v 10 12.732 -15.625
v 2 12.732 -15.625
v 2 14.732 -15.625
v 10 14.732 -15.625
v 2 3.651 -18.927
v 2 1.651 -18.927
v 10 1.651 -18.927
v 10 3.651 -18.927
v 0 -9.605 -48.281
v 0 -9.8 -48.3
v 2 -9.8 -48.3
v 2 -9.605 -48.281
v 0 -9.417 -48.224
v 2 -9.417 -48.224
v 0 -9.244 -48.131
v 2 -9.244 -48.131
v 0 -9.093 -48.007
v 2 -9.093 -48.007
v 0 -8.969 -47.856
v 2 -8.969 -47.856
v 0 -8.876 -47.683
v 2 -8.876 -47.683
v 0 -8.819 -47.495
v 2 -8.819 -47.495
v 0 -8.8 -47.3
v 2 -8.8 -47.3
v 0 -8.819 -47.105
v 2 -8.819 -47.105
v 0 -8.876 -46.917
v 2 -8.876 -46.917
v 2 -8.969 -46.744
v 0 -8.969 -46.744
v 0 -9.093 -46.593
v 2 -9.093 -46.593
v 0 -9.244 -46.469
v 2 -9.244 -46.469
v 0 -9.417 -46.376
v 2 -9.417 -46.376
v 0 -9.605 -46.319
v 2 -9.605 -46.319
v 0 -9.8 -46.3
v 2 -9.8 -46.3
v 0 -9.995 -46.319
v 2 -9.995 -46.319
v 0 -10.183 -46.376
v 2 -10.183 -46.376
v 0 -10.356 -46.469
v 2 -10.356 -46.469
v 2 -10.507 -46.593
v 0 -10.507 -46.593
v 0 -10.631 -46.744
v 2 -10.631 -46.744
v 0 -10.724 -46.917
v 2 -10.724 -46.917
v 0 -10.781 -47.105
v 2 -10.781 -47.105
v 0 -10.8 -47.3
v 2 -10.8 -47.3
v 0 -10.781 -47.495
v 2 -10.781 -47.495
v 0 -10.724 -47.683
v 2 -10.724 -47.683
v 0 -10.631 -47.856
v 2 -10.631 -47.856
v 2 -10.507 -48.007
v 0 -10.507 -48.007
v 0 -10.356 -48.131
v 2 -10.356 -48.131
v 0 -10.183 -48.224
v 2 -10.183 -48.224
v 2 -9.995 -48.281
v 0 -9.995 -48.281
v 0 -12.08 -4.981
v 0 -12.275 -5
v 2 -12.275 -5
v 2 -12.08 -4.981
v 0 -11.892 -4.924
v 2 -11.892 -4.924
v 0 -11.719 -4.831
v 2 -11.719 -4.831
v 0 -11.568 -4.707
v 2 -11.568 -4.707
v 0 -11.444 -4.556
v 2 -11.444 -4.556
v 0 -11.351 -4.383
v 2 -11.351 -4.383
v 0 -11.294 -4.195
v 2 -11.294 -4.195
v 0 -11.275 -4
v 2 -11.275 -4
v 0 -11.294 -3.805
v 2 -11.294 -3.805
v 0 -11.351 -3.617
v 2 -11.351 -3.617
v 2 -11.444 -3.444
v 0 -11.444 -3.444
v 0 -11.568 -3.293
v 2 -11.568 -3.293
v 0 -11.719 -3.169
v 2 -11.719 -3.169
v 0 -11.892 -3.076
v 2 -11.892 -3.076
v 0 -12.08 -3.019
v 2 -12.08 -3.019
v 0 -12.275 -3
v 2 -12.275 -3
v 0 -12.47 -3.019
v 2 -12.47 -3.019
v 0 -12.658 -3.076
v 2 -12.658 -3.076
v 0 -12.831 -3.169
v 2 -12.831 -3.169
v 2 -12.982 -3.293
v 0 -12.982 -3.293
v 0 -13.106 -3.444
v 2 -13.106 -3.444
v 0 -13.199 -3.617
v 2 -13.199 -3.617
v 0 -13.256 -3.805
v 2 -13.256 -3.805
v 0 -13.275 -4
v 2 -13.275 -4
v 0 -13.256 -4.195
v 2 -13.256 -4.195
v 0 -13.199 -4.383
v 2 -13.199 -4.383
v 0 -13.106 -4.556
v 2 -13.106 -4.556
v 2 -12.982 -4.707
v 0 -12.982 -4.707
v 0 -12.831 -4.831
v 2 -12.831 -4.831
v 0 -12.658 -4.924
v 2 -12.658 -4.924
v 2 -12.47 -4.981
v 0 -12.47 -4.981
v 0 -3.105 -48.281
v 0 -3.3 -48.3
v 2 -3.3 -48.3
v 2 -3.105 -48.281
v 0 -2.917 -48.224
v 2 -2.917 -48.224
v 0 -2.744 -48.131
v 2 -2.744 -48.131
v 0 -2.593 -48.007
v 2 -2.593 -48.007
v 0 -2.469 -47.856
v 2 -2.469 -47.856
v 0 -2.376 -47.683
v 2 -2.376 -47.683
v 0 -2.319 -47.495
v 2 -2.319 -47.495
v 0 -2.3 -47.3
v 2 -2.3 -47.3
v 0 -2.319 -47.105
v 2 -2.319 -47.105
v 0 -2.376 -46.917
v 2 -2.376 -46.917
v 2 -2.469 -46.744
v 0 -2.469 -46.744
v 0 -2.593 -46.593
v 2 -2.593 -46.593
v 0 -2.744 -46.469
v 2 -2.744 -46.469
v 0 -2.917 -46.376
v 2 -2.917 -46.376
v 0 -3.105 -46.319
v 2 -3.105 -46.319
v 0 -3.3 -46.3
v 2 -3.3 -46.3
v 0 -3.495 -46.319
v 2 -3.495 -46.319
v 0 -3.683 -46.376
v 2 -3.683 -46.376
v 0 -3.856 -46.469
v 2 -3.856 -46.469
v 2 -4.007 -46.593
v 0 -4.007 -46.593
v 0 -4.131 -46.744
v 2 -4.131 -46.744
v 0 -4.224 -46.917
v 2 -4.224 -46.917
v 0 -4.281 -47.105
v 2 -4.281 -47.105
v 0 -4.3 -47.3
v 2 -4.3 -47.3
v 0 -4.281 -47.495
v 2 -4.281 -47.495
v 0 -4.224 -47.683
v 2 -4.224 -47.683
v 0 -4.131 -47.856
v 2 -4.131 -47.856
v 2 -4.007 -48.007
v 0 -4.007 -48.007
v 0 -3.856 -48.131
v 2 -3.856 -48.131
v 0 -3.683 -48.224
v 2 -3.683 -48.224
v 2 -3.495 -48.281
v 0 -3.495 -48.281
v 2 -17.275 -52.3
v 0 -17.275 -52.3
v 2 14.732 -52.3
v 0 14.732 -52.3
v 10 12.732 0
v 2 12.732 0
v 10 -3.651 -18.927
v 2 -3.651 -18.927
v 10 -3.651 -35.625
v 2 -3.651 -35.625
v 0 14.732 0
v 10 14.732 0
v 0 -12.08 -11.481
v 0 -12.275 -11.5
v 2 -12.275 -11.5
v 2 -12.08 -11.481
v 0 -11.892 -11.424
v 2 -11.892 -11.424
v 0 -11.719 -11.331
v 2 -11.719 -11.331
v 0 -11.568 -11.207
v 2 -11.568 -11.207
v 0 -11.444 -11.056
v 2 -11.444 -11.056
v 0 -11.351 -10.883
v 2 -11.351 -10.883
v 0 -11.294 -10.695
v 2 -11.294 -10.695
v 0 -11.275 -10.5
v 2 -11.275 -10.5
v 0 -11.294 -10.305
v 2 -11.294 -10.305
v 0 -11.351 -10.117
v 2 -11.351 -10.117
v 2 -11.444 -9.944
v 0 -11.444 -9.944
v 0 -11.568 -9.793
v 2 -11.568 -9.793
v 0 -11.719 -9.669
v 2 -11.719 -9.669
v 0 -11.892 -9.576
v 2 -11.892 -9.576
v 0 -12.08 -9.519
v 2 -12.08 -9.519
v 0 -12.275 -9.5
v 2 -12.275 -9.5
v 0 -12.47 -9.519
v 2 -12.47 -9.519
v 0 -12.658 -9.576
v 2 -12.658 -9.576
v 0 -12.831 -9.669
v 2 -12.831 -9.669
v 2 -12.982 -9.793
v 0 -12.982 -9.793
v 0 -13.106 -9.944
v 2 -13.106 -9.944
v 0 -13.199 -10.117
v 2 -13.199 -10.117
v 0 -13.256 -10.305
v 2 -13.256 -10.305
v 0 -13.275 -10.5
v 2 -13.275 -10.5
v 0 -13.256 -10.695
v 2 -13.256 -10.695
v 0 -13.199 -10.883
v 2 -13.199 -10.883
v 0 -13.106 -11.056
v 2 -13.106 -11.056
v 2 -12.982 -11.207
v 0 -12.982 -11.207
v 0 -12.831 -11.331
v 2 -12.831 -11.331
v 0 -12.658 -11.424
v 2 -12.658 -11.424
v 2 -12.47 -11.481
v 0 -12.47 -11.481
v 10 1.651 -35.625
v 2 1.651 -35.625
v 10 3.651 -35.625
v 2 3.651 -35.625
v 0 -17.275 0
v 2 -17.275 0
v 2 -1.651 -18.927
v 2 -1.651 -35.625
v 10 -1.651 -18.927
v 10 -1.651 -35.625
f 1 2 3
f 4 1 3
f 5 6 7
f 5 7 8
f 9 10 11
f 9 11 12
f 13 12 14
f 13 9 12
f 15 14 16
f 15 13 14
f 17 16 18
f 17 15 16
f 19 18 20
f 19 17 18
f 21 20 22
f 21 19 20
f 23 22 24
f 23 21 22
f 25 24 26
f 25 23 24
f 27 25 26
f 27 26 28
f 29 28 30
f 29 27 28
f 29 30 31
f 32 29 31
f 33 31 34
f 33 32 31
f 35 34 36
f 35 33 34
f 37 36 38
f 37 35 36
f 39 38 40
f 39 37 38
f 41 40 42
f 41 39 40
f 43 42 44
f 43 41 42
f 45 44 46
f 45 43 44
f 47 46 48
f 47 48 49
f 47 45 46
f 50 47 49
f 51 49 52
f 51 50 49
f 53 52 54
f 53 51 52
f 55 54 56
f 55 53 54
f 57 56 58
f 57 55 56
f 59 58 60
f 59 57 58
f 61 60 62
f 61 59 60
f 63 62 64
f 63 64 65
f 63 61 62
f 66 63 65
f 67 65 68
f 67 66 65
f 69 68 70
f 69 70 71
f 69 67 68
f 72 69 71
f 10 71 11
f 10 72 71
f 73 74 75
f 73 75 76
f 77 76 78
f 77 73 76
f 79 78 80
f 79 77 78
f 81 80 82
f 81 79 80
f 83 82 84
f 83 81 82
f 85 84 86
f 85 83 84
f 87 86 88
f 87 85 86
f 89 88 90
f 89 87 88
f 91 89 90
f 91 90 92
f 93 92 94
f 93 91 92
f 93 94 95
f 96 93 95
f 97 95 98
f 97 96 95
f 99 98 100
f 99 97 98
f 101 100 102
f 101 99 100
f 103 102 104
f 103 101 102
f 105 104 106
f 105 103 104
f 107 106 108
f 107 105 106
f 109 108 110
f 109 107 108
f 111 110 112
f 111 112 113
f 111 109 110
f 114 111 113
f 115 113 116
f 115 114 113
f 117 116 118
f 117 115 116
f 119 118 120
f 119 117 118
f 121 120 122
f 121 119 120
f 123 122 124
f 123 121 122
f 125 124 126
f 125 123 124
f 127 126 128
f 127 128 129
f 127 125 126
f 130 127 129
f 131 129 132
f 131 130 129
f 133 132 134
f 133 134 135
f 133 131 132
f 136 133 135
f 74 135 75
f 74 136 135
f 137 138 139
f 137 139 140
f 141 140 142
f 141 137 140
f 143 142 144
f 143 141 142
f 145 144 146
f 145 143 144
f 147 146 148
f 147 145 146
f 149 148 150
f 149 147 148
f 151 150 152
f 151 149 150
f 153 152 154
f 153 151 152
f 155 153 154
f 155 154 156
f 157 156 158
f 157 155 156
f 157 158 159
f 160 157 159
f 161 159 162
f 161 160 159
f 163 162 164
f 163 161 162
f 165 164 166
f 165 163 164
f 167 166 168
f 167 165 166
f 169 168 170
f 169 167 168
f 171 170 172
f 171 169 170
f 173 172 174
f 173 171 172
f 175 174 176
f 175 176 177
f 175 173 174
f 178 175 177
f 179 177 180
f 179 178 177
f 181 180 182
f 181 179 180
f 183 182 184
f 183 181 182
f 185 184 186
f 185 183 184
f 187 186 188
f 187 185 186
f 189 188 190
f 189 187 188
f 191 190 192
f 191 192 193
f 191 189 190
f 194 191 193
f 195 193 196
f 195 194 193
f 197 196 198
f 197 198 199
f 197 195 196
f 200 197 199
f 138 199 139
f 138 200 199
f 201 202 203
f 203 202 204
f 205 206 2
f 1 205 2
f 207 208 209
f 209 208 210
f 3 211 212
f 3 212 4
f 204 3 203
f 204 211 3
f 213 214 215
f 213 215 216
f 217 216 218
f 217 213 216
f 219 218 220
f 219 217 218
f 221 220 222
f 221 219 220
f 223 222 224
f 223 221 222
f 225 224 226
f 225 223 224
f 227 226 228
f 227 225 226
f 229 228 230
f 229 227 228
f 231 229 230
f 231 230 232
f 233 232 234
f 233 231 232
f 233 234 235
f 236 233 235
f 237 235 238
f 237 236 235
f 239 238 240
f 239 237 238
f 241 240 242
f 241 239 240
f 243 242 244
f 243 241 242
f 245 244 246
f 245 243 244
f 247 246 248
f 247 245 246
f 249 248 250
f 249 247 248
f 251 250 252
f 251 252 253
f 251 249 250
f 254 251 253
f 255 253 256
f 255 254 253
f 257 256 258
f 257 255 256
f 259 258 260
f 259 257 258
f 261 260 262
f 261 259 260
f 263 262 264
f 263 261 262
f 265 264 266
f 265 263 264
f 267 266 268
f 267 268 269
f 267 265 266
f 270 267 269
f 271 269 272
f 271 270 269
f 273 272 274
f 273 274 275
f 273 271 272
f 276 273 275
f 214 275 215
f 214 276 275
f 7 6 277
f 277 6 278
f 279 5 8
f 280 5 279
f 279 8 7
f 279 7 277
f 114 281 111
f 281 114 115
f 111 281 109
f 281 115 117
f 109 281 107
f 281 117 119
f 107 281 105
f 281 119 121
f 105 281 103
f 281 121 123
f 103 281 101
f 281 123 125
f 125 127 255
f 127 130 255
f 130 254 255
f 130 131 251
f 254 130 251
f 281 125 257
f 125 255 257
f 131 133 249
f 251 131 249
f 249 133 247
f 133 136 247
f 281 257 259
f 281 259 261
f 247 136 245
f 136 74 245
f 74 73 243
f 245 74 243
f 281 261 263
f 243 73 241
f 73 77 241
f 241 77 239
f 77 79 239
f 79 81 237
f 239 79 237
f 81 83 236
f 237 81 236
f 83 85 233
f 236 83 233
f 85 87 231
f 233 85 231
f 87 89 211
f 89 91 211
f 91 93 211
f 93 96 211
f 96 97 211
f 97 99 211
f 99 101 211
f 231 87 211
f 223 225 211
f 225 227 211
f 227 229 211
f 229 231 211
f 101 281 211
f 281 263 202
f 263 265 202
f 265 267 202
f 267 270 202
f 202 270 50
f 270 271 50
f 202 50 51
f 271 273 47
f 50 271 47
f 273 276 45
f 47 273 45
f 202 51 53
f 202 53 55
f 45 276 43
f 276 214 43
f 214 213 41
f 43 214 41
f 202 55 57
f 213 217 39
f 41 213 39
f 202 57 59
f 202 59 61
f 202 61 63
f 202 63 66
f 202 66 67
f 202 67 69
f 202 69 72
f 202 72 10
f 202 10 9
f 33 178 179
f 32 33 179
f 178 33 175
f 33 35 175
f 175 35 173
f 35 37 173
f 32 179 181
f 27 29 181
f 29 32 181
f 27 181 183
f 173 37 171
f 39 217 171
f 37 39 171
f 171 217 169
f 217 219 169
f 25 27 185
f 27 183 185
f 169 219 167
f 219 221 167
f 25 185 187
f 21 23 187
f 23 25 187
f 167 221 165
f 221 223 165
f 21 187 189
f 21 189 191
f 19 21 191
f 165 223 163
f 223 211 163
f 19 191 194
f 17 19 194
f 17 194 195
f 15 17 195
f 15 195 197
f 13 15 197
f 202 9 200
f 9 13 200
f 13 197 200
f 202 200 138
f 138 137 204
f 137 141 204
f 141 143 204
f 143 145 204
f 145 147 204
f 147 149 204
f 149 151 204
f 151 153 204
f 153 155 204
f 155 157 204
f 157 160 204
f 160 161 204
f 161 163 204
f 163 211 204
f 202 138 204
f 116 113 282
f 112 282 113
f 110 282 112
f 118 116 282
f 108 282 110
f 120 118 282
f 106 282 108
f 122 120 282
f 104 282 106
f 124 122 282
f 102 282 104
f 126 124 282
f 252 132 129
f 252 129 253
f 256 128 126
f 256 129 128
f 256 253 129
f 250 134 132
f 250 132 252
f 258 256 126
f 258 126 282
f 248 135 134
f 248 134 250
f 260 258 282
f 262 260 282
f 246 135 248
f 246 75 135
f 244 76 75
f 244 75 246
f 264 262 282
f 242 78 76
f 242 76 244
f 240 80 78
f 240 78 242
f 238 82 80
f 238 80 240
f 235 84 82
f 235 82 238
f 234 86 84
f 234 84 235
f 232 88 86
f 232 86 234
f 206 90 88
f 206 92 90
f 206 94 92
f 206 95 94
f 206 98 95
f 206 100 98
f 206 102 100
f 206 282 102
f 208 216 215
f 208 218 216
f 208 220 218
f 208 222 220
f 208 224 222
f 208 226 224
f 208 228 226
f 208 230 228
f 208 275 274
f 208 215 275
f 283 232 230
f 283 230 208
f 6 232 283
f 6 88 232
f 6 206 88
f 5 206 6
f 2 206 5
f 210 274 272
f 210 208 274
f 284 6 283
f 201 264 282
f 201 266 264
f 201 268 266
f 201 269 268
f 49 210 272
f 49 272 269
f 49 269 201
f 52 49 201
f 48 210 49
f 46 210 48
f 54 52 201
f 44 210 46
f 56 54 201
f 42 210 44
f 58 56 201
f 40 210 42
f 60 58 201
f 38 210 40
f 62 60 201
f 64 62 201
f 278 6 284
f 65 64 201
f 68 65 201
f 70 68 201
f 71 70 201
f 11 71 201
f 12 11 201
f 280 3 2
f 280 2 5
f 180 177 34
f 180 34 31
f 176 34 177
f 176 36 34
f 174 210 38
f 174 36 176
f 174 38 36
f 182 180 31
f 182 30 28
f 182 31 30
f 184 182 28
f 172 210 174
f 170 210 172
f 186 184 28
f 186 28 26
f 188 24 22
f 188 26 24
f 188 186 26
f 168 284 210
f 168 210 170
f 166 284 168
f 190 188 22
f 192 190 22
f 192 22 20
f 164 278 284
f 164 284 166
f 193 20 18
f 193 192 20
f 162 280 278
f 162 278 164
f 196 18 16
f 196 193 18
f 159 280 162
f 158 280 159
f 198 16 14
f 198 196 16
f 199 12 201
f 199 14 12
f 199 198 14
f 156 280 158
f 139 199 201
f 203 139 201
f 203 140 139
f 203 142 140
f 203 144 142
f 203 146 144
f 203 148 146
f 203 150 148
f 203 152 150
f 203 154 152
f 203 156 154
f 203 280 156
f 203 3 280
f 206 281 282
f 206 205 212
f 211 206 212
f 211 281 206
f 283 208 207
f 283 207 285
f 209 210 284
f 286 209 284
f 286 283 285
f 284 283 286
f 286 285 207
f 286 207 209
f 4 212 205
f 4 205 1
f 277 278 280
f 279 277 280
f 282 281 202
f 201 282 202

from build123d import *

# Parameters (mm, degrees)
SKETCH1_W           = 52.3
SKETCH1_H           = 32.007
SKETCH1_R           = 1
BOSS_EXTRUDE1_DEPTH = 2
SKETCH1_3_W         = 15.625
SKETCH1_3_H         = 2
SKETCH1_3_W_2       = 16.698
BOSS_EXTRUDE2_DEPTH = 10


with BuildPart() as part:
    # Sketch1 → Boss-Extrude1 (new body)
    with BuildSketch(Plane(origin=(0, 0, 0), x_dir=(0, 0, -1), z_dir=(1, 0, 0))):
        with Locations((26.15, -1.27147436)):
            Rectangle(SKETCH1_W, SKETCH1_H)
        with Locations((4, -12.27497436)):
            Circle(SKETCH1_R, mode=Mode.SUBTRACT)
        with Locations((10.5, -12.27497436)):
            Circle(SKETCH1_R, mode=Mode.SUBTRACT)
        with Locations((47.3, -9.8)):
            Circle(SKETCH1_R, mode=Mode.SUBTRACT)
        with Locations((47.3, -3.3)):
            Circle(SKETCH1_R, mode=Mode.SUBTRACT)
    extrude(amount=BOSS_EXTRUDE1_DEPTH)

    # Sketch1<3> → Boss-Extrude2 (add)
    with BuildSketch(Plane(origin=(0, 0, 0), x_dir=(0, 0, -1), z_dir=(1, 0, 0))):
        with Locations((7.8125, 13.73202564)):
            Rectangle(SKETCH1_3_W, SKETCH1_3_H)
        with Locations((27.276, 2.651)):
            Rectangle(SKETCH1_3_W_2, SKETCH1_3_H)
        with Locations((27.276, -2.651)):
            Rectangle(SKETCH1_3_W_2, SKETCH1_3_H)
    extrude(amount=BOSS_EXTRUDE2_DEPTH)


solid = part.part
